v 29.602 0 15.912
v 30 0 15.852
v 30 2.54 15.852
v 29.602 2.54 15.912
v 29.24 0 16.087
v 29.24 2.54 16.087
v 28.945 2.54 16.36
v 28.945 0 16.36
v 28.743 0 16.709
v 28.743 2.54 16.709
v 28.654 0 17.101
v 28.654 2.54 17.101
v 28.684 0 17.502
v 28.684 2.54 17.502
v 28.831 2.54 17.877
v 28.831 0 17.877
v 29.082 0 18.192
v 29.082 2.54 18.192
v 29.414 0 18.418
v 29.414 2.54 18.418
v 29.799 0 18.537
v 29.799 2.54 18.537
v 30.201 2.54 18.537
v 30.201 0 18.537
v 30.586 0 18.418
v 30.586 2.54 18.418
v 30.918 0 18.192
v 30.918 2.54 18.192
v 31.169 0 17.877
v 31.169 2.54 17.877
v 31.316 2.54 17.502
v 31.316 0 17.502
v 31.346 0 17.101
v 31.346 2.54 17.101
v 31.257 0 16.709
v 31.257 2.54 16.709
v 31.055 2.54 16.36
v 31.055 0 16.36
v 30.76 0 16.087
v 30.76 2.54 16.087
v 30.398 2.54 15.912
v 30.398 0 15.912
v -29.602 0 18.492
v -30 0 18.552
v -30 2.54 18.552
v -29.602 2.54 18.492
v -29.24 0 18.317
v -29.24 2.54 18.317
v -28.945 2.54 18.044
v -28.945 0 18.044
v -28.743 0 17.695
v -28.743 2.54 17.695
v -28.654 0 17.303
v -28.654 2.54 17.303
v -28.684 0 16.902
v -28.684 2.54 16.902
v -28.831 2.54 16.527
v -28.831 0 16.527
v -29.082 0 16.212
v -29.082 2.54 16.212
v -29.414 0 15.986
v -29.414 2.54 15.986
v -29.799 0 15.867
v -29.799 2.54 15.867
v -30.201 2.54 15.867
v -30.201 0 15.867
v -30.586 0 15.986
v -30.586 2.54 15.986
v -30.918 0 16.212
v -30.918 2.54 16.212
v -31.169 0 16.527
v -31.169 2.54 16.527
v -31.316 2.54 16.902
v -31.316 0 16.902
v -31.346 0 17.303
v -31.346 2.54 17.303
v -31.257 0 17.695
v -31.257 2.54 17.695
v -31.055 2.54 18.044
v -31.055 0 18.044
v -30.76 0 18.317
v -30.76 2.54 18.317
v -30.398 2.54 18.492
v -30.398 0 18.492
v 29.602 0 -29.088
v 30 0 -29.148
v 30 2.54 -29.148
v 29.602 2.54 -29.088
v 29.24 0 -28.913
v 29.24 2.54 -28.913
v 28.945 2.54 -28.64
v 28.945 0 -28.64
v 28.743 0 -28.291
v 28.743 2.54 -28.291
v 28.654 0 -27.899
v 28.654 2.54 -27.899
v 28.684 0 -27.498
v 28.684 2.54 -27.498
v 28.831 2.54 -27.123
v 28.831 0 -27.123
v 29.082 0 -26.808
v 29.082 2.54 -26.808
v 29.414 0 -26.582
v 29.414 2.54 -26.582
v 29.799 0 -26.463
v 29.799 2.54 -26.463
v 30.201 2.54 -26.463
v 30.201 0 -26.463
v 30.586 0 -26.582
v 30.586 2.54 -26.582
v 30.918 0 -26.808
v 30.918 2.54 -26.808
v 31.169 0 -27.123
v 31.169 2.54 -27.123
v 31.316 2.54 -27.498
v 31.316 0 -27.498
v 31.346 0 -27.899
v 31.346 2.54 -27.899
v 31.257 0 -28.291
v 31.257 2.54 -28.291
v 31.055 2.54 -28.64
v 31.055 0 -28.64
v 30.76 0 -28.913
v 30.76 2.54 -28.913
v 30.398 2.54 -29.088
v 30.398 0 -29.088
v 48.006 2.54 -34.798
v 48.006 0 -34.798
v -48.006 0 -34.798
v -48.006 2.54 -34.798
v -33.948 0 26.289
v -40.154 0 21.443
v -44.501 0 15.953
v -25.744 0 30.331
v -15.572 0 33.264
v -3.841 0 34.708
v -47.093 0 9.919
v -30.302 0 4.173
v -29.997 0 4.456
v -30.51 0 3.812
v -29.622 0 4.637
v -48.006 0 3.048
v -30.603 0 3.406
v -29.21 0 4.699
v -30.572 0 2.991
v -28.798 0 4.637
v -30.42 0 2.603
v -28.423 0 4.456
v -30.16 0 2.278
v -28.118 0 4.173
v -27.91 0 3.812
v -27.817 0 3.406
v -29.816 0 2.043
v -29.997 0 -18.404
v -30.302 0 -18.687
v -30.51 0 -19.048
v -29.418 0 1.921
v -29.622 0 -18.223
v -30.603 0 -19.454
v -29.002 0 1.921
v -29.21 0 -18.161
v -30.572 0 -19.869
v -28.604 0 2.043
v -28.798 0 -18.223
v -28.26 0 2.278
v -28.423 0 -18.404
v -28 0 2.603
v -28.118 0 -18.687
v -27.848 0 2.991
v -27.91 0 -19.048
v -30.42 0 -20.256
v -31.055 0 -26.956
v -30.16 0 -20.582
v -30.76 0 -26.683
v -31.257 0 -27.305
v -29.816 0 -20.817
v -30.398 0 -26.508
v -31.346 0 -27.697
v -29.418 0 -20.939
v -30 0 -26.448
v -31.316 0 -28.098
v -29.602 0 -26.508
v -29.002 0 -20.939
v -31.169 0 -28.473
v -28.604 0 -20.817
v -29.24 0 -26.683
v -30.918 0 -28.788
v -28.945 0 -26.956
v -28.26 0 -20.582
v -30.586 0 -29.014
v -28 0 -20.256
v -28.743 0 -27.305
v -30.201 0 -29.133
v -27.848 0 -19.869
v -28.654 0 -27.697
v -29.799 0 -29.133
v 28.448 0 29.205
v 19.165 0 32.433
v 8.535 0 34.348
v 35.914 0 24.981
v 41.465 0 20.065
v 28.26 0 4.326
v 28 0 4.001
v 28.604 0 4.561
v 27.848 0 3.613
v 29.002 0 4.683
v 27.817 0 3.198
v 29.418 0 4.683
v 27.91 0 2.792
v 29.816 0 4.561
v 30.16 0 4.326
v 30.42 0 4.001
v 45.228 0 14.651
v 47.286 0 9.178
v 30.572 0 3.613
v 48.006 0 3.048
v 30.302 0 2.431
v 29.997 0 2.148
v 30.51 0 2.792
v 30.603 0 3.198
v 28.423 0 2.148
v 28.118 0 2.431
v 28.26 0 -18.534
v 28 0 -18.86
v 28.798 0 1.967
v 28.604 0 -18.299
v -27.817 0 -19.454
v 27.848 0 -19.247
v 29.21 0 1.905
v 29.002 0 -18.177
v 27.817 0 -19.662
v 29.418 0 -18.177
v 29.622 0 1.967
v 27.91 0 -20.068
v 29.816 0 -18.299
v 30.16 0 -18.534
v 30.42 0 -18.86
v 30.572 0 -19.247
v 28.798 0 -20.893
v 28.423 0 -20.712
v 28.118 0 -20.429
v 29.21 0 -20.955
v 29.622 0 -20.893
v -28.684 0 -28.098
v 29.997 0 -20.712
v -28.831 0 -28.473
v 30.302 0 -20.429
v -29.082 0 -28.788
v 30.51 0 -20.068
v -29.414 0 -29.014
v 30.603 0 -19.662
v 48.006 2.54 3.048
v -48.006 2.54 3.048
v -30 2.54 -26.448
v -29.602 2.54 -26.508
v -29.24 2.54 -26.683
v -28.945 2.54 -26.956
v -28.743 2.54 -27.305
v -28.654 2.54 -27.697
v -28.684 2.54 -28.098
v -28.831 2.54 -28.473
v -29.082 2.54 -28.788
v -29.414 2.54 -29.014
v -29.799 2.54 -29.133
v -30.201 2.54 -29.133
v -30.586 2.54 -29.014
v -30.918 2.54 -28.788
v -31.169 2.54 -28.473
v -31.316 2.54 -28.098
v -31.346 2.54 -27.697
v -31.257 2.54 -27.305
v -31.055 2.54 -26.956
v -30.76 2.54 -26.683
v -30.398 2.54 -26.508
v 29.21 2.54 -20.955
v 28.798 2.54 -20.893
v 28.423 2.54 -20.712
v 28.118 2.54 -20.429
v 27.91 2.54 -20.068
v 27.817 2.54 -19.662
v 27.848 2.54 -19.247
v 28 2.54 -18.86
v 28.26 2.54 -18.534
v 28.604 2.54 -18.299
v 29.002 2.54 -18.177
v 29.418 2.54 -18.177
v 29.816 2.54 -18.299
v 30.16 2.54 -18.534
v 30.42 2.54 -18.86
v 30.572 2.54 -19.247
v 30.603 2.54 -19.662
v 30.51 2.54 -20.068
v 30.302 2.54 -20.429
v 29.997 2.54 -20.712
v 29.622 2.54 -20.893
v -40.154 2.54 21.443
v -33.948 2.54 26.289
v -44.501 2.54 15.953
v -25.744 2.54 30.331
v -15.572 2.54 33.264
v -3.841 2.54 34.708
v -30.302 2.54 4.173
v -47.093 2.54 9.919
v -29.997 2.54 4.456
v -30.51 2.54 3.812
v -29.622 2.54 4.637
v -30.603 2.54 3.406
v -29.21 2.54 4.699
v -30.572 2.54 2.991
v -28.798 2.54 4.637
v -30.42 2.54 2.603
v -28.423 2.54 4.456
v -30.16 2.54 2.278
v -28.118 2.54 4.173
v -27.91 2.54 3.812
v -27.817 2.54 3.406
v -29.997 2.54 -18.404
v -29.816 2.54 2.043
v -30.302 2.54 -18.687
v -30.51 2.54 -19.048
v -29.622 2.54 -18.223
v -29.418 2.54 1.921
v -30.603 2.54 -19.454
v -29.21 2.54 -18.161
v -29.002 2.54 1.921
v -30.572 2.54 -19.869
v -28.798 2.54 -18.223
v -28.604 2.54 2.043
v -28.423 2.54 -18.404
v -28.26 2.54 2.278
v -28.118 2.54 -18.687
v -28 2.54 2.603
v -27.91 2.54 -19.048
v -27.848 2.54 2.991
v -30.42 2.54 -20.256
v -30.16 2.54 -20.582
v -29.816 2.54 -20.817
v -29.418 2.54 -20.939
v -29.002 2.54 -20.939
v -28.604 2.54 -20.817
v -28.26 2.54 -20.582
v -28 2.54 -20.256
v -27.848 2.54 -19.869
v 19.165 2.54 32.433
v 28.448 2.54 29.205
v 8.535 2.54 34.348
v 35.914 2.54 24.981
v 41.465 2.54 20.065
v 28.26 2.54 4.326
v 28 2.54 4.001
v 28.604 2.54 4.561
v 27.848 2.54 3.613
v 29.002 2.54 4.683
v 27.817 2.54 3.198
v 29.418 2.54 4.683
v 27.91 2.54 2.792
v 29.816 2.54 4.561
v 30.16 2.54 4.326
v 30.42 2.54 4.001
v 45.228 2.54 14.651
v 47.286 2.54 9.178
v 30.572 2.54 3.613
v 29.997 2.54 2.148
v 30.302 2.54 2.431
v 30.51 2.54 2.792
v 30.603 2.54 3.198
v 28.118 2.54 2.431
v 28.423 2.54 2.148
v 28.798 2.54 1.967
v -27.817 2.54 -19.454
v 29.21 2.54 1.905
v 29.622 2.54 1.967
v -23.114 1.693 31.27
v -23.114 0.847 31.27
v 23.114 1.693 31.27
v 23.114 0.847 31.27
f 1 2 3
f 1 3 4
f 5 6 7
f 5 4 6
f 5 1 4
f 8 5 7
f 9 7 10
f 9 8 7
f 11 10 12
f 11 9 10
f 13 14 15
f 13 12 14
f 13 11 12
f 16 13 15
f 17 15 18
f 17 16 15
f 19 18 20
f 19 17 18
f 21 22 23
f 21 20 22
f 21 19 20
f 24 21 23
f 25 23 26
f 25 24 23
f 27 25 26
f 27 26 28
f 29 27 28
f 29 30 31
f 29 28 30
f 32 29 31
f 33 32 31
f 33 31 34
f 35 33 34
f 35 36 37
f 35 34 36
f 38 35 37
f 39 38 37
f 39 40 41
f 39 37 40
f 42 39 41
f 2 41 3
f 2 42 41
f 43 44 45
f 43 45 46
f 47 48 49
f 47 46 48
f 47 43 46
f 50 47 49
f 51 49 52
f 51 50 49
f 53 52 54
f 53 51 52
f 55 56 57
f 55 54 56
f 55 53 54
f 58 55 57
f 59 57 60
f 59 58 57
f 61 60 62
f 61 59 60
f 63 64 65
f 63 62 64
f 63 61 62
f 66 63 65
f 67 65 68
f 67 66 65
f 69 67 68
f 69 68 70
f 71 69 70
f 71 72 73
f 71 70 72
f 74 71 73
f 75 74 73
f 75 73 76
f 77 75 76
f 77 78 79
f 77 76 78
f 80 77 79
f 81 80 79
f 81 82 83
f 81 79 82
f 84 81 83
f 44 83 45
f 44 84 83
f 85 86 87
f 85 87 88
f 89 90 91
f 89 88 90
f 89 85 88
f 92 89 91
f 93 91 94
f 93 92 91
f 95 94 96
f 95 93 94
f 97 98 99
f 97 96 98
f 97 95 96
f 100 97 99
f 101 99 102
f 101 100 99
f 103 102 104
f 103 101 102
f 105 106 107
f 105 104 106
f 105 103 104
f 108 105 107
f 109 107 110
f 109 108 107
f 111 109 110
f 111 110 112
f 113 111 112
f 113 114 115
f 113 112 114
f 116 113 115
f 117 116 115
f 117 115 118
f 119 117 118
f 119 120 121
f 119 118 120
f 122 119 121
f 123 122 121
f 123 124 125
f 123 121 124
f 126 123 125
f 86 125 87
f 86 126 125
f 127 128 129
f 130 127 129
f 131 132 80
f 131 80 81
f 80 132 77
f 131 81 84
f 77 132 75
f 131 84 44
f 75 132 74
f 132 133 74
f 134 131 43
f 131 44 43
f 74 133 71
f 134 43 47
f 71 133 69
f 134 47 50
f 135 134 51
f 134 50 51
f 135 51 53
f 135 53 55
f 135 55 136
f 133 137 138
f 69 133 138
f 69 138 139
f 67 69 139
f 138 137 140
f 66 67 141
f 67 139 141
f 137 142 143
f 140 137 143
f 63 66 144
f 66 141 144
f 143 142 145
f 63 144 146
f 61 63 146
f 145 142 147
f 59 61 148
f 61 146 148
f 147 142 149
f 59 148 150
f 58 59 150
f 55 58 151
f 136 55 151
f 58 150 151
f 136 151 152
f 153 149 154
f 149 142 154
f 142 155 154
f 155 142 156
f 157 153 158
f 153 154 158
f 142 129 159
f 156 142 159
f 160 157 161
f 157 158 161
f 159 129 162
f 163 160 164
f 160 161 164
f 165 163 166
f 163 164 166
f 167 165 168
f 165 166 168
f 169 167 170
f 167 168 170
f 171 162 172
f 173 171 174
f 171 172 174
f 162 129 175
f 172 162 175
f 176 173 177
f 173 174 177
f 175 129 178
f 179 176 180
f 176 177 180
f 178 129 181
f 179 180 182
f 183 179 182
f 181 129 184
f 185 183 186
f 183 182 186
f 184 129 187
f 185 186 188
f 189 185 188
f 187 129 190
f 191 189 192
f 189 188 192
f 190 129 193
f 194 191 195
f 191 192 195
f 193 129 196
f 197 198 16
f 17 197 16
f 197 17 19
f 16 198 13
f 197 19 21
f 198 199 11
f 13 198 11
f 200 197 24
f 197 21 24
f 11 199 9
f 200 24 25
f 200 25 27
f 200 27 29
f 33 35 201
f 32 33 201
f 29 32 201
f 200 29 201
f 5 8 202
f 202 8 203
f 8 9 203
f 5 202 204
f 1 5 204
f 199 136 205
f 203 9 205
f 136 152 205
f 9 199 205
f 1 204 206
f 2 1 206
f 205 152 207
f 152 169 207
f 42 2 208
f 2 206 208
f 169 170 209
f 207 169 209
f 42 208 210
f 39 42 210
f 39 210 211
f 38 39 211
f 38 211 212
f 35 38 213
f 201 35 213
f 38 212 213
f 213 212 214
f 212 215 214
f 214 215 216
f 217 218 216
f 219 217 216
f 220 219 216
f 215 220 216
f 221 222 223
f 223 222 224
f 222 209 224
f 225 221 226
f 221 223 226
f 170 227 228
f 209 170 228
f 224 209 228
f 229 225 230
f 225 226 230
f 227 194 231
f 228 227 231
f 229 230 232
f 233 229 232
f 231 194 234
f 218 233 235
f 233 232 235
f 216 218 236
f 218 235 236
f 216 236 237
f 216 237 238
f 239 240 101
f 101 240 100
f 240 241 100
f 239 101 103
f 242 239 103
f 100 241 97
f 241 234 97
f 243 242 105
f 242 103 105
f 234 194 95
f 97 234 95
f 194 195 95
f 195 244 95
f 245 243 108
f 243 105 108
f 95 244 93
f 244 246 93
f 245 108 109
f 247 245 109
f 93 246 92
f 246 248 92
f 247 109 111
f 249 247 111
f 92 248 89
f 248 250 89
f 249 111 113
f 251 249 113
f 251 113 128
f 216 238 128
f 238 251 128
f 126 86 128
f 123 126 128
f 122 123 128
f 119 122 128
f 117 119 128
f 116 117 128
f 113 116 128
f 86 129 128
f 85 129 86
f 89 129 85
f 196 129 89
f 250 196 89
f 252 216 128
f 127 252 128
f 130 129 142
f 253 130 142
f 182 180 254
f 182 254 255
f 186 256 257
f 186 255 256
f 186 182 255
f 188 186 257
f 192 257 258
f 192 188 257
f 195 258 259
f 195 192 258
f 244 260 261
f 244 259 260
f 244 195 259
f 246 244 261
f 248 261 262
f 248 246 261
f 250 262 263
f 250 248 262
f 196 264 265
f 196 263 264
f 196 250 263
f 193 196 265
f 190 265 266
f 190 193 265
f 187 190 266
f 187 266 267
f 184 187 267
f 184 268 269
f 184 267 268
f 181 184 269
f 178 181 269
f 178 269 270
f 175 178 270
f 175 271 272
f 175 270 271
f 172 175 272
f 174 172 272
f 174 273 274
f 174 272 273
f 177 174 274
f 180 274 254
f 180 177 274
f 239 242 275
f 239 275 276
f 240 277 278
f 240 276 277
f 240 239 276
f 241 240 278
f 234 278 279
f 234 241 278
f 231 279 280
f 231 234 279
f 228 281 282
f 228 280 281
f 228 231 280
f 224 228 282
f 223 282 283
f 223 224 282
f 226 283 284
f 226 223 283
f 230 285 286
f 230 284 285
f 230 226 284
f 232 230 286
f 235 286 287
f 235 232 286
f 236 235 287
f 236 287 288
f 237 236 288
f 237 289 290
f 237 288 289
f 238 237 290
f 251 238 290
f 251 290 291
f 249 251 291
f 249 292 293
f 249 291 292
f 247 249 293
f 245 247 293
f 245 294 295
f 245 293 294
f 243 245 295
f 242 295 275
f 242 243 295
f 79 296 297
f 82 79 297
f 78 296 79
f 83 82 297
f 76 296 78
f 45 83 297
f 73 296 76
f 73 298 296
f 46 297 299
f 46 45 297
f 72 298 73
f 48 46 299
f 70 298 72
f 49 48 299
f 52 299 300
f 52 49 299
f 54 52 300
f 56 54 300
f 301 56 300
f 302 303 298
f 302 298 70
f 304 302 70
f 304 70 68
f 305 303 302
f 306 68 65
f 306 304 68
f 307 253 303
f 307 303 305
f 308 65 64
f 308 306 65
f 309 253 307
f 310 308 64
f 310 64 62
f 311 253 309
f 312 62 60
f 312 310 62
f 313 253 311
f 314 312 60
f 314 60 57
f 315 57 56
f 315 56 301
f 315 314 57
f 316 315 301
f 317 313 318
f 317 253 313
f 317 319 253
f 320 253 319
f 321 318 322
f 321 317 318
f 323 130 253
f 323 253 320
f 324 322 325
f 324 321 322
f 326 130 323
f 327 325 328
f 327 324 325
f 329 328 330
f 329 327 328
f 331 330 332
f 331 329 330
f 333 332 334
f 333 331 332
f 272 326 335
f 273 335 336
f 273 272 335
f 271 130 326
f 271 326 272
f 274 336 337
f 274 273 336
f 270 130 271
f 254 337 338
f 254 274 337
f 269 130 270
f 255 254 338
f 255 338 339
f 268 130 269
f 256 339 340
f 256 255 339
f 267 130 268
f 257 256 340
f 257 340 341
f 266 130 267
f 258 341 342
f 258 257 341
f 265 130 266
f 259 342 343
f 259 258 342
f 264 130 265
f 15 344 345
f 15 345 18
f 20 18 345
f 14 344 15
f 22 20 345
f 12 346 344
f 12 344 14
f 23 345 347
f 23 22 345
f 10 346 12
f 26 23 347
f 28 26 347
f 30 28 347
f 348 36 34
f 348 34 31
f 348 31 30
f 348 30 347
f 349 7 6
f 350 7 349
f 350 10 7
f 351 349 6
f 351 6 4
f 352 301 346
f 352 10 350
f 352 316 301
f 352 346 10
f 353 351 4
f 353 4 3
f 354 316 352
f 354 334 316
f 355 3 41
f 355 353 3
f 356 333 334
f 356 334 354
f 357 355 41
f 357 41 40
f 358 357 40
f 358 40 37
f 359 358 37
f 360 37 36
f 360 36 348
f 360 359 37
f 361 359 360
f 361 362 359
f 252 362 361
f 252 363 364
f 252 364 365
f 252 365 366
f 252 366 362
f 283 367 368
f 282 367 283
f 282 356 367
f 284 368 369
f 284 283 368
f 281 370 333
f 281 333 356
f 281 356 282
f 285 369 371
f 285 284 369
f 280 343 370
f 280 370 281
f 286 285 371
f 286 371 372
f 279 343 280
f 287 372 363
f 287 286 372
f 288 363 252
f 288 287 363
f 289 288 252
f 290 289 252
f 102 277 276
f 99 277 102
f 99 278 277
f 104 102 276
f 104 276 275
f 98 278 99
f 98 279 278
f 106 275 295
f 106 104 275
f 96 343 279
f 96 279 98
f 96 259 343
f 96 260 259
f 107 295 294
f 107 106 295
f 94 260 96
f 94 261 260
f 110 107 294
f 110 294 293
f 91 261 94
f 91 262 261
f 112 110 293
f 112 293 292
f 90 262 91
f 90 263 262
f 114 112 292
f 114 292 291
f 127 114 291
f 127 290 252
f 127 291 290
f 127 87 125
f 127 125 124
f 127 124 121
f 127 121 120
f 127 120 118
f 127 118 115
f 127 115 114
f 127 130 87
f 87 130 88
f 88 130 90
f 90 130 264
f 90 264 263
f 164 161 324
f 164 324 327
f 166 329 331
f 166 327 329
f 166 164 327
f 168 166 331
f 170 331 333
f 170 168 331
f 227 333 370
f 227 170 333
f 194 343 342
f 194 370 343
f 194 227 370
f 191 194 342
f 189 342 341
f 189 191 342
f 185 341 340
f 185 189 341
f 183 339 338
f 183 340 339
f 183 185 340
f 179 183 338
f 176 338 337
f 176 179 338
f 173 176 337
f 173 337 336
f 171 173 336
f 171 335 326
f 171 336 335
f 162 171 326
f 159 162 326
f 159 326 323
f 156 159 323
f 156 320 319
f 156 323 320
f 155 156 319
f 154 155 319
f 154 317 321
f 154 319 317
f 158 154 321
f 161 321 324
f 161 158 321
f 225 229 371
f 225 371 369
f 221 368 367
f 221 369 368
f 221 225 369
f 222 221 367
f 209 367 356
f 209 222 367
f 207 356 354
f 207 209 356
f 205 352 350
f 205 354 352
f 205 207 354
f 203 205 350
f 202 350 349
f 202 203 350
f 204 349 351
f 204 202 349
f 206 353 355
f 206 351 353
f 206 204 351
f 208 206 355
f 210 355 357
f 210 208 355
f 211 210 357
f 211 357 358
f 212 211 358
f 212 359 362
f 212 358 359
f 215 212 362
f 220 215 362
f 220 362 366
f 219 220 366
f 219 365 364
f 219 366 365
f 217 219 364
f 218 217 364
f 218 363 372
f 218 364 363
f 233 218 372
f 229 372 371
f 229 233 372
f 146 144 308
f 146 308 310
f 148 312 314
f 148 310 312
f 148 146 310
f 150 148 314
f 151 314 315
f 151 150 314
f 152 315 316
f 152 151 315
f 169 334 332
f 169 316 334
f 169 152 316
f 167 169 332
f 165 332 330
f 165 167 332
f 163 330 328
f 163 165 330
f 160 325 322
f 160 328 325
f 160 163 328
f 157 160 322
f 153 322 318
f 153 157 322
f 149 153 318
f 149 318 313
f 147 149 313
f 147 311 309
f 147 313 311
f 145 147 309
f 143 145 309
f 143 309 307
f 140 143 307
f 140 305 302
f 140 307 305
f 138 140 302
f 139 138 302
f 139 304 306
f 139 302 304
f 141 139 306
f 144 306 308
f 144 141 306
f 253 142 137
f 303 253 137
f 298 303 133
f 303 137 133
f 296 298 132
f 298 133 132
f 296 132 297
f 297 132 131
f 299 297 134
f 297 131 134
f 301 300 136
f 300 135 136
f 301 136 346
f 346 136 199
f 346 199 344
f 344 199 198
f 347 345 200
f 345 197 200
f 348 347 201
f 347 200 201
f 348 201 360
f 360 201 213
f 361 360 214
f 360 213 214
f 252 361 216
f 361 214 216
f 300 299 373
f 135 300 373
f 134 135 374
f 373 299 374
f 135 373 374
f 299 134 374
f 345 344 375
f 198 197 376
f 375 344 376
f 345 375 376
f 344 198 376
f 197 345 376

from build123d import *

# Parameters (mm, degrees)
BOSS_EXTRUDE1_DEPTH     = 2.54
CUT_EXTRUDE1_DEPTH      = 60.34583774
CUT_EXTRUDE1_DEPTH_BACK = 60.34583774
SKETCH3_R               = 1.35
SKETCH3_R_2             = 1.397


with BuildPart() as part:
    # Sketch2 → Boss-Extrude1 (new body)
    with BuildSketch(Plane(origin=(0, 0, 0), x_dir=(1, 0, 0), z_dir=(0, 1, 0))):
        with BuildLine():
            Line((48.006, 34.798), (-48.006, 34.798))
            Line((-48.006, 34.798), (-48.006, -3.048))
            add(Edge.make_bspline(
                [(-48.006, -3.048), (-48.006, -45.381333333), (48.006, -45.381333333), (48.006, -3.048)],
                knots=[0, 0, 0, 0, 1, 1, 1, 1], degree=3))
            Line((48.006, -3.048), (48.006, 34.798))
        make_face()
    extrude(amount=BOSS_EXTRUDE1_DEPTH)

    # Sketch3 → Cut-Extrude1 (cut, two sides: drawn at the far end of the back side and taken through both)
    with BuildSketch(Plane(origin=(0, 2.54, 0), x_dir=(1, 0, 0), z_dir=(0, 1, 0)).offset(-CUT_EXTRUDE1_DEPTH_BACK)):
        with Locations(Location((-30, 27.798, 0), (0, 0, 270))):
            Circle(SKETCH3_R)
        with Locations(Location((-30, -17.202, 0), (0, 0, 270))):
            Circle(SKETCH3_R)
        with Locations(Location((30, -17.202, 0), (0, 0, 90))):
            Circle(SKETCH3_R)
        with Locations(Location((30, 27.798, 0), (0, 0, 90))):
            Circle(SKETCH3_R)
        with Locations(Location((-29.21, 19.558, 0), (0, 0, 270))):
            Circle(SKETCH3_R_2)
        with Locations(Location((-29.21, -3.302, 0), (0, 0, 270))):
            Circle(SKETCH3_R_2)
        with Locations(Location((29.21, -3.302, 0), (0, 0, 90))):
            Circle(SKETCH3_R_2)
        with Locations(Location((29.21, 19.558, 0), (0, 0, 90))):
            Circle(SKETCH3_R_2)
    extrude(amount=CUT_EXTRUDE1_DEPTH + CUT_EXTRUDE1_DEPTH_BACK, mode=Mode.SUBTRACT)


solid = part.part
